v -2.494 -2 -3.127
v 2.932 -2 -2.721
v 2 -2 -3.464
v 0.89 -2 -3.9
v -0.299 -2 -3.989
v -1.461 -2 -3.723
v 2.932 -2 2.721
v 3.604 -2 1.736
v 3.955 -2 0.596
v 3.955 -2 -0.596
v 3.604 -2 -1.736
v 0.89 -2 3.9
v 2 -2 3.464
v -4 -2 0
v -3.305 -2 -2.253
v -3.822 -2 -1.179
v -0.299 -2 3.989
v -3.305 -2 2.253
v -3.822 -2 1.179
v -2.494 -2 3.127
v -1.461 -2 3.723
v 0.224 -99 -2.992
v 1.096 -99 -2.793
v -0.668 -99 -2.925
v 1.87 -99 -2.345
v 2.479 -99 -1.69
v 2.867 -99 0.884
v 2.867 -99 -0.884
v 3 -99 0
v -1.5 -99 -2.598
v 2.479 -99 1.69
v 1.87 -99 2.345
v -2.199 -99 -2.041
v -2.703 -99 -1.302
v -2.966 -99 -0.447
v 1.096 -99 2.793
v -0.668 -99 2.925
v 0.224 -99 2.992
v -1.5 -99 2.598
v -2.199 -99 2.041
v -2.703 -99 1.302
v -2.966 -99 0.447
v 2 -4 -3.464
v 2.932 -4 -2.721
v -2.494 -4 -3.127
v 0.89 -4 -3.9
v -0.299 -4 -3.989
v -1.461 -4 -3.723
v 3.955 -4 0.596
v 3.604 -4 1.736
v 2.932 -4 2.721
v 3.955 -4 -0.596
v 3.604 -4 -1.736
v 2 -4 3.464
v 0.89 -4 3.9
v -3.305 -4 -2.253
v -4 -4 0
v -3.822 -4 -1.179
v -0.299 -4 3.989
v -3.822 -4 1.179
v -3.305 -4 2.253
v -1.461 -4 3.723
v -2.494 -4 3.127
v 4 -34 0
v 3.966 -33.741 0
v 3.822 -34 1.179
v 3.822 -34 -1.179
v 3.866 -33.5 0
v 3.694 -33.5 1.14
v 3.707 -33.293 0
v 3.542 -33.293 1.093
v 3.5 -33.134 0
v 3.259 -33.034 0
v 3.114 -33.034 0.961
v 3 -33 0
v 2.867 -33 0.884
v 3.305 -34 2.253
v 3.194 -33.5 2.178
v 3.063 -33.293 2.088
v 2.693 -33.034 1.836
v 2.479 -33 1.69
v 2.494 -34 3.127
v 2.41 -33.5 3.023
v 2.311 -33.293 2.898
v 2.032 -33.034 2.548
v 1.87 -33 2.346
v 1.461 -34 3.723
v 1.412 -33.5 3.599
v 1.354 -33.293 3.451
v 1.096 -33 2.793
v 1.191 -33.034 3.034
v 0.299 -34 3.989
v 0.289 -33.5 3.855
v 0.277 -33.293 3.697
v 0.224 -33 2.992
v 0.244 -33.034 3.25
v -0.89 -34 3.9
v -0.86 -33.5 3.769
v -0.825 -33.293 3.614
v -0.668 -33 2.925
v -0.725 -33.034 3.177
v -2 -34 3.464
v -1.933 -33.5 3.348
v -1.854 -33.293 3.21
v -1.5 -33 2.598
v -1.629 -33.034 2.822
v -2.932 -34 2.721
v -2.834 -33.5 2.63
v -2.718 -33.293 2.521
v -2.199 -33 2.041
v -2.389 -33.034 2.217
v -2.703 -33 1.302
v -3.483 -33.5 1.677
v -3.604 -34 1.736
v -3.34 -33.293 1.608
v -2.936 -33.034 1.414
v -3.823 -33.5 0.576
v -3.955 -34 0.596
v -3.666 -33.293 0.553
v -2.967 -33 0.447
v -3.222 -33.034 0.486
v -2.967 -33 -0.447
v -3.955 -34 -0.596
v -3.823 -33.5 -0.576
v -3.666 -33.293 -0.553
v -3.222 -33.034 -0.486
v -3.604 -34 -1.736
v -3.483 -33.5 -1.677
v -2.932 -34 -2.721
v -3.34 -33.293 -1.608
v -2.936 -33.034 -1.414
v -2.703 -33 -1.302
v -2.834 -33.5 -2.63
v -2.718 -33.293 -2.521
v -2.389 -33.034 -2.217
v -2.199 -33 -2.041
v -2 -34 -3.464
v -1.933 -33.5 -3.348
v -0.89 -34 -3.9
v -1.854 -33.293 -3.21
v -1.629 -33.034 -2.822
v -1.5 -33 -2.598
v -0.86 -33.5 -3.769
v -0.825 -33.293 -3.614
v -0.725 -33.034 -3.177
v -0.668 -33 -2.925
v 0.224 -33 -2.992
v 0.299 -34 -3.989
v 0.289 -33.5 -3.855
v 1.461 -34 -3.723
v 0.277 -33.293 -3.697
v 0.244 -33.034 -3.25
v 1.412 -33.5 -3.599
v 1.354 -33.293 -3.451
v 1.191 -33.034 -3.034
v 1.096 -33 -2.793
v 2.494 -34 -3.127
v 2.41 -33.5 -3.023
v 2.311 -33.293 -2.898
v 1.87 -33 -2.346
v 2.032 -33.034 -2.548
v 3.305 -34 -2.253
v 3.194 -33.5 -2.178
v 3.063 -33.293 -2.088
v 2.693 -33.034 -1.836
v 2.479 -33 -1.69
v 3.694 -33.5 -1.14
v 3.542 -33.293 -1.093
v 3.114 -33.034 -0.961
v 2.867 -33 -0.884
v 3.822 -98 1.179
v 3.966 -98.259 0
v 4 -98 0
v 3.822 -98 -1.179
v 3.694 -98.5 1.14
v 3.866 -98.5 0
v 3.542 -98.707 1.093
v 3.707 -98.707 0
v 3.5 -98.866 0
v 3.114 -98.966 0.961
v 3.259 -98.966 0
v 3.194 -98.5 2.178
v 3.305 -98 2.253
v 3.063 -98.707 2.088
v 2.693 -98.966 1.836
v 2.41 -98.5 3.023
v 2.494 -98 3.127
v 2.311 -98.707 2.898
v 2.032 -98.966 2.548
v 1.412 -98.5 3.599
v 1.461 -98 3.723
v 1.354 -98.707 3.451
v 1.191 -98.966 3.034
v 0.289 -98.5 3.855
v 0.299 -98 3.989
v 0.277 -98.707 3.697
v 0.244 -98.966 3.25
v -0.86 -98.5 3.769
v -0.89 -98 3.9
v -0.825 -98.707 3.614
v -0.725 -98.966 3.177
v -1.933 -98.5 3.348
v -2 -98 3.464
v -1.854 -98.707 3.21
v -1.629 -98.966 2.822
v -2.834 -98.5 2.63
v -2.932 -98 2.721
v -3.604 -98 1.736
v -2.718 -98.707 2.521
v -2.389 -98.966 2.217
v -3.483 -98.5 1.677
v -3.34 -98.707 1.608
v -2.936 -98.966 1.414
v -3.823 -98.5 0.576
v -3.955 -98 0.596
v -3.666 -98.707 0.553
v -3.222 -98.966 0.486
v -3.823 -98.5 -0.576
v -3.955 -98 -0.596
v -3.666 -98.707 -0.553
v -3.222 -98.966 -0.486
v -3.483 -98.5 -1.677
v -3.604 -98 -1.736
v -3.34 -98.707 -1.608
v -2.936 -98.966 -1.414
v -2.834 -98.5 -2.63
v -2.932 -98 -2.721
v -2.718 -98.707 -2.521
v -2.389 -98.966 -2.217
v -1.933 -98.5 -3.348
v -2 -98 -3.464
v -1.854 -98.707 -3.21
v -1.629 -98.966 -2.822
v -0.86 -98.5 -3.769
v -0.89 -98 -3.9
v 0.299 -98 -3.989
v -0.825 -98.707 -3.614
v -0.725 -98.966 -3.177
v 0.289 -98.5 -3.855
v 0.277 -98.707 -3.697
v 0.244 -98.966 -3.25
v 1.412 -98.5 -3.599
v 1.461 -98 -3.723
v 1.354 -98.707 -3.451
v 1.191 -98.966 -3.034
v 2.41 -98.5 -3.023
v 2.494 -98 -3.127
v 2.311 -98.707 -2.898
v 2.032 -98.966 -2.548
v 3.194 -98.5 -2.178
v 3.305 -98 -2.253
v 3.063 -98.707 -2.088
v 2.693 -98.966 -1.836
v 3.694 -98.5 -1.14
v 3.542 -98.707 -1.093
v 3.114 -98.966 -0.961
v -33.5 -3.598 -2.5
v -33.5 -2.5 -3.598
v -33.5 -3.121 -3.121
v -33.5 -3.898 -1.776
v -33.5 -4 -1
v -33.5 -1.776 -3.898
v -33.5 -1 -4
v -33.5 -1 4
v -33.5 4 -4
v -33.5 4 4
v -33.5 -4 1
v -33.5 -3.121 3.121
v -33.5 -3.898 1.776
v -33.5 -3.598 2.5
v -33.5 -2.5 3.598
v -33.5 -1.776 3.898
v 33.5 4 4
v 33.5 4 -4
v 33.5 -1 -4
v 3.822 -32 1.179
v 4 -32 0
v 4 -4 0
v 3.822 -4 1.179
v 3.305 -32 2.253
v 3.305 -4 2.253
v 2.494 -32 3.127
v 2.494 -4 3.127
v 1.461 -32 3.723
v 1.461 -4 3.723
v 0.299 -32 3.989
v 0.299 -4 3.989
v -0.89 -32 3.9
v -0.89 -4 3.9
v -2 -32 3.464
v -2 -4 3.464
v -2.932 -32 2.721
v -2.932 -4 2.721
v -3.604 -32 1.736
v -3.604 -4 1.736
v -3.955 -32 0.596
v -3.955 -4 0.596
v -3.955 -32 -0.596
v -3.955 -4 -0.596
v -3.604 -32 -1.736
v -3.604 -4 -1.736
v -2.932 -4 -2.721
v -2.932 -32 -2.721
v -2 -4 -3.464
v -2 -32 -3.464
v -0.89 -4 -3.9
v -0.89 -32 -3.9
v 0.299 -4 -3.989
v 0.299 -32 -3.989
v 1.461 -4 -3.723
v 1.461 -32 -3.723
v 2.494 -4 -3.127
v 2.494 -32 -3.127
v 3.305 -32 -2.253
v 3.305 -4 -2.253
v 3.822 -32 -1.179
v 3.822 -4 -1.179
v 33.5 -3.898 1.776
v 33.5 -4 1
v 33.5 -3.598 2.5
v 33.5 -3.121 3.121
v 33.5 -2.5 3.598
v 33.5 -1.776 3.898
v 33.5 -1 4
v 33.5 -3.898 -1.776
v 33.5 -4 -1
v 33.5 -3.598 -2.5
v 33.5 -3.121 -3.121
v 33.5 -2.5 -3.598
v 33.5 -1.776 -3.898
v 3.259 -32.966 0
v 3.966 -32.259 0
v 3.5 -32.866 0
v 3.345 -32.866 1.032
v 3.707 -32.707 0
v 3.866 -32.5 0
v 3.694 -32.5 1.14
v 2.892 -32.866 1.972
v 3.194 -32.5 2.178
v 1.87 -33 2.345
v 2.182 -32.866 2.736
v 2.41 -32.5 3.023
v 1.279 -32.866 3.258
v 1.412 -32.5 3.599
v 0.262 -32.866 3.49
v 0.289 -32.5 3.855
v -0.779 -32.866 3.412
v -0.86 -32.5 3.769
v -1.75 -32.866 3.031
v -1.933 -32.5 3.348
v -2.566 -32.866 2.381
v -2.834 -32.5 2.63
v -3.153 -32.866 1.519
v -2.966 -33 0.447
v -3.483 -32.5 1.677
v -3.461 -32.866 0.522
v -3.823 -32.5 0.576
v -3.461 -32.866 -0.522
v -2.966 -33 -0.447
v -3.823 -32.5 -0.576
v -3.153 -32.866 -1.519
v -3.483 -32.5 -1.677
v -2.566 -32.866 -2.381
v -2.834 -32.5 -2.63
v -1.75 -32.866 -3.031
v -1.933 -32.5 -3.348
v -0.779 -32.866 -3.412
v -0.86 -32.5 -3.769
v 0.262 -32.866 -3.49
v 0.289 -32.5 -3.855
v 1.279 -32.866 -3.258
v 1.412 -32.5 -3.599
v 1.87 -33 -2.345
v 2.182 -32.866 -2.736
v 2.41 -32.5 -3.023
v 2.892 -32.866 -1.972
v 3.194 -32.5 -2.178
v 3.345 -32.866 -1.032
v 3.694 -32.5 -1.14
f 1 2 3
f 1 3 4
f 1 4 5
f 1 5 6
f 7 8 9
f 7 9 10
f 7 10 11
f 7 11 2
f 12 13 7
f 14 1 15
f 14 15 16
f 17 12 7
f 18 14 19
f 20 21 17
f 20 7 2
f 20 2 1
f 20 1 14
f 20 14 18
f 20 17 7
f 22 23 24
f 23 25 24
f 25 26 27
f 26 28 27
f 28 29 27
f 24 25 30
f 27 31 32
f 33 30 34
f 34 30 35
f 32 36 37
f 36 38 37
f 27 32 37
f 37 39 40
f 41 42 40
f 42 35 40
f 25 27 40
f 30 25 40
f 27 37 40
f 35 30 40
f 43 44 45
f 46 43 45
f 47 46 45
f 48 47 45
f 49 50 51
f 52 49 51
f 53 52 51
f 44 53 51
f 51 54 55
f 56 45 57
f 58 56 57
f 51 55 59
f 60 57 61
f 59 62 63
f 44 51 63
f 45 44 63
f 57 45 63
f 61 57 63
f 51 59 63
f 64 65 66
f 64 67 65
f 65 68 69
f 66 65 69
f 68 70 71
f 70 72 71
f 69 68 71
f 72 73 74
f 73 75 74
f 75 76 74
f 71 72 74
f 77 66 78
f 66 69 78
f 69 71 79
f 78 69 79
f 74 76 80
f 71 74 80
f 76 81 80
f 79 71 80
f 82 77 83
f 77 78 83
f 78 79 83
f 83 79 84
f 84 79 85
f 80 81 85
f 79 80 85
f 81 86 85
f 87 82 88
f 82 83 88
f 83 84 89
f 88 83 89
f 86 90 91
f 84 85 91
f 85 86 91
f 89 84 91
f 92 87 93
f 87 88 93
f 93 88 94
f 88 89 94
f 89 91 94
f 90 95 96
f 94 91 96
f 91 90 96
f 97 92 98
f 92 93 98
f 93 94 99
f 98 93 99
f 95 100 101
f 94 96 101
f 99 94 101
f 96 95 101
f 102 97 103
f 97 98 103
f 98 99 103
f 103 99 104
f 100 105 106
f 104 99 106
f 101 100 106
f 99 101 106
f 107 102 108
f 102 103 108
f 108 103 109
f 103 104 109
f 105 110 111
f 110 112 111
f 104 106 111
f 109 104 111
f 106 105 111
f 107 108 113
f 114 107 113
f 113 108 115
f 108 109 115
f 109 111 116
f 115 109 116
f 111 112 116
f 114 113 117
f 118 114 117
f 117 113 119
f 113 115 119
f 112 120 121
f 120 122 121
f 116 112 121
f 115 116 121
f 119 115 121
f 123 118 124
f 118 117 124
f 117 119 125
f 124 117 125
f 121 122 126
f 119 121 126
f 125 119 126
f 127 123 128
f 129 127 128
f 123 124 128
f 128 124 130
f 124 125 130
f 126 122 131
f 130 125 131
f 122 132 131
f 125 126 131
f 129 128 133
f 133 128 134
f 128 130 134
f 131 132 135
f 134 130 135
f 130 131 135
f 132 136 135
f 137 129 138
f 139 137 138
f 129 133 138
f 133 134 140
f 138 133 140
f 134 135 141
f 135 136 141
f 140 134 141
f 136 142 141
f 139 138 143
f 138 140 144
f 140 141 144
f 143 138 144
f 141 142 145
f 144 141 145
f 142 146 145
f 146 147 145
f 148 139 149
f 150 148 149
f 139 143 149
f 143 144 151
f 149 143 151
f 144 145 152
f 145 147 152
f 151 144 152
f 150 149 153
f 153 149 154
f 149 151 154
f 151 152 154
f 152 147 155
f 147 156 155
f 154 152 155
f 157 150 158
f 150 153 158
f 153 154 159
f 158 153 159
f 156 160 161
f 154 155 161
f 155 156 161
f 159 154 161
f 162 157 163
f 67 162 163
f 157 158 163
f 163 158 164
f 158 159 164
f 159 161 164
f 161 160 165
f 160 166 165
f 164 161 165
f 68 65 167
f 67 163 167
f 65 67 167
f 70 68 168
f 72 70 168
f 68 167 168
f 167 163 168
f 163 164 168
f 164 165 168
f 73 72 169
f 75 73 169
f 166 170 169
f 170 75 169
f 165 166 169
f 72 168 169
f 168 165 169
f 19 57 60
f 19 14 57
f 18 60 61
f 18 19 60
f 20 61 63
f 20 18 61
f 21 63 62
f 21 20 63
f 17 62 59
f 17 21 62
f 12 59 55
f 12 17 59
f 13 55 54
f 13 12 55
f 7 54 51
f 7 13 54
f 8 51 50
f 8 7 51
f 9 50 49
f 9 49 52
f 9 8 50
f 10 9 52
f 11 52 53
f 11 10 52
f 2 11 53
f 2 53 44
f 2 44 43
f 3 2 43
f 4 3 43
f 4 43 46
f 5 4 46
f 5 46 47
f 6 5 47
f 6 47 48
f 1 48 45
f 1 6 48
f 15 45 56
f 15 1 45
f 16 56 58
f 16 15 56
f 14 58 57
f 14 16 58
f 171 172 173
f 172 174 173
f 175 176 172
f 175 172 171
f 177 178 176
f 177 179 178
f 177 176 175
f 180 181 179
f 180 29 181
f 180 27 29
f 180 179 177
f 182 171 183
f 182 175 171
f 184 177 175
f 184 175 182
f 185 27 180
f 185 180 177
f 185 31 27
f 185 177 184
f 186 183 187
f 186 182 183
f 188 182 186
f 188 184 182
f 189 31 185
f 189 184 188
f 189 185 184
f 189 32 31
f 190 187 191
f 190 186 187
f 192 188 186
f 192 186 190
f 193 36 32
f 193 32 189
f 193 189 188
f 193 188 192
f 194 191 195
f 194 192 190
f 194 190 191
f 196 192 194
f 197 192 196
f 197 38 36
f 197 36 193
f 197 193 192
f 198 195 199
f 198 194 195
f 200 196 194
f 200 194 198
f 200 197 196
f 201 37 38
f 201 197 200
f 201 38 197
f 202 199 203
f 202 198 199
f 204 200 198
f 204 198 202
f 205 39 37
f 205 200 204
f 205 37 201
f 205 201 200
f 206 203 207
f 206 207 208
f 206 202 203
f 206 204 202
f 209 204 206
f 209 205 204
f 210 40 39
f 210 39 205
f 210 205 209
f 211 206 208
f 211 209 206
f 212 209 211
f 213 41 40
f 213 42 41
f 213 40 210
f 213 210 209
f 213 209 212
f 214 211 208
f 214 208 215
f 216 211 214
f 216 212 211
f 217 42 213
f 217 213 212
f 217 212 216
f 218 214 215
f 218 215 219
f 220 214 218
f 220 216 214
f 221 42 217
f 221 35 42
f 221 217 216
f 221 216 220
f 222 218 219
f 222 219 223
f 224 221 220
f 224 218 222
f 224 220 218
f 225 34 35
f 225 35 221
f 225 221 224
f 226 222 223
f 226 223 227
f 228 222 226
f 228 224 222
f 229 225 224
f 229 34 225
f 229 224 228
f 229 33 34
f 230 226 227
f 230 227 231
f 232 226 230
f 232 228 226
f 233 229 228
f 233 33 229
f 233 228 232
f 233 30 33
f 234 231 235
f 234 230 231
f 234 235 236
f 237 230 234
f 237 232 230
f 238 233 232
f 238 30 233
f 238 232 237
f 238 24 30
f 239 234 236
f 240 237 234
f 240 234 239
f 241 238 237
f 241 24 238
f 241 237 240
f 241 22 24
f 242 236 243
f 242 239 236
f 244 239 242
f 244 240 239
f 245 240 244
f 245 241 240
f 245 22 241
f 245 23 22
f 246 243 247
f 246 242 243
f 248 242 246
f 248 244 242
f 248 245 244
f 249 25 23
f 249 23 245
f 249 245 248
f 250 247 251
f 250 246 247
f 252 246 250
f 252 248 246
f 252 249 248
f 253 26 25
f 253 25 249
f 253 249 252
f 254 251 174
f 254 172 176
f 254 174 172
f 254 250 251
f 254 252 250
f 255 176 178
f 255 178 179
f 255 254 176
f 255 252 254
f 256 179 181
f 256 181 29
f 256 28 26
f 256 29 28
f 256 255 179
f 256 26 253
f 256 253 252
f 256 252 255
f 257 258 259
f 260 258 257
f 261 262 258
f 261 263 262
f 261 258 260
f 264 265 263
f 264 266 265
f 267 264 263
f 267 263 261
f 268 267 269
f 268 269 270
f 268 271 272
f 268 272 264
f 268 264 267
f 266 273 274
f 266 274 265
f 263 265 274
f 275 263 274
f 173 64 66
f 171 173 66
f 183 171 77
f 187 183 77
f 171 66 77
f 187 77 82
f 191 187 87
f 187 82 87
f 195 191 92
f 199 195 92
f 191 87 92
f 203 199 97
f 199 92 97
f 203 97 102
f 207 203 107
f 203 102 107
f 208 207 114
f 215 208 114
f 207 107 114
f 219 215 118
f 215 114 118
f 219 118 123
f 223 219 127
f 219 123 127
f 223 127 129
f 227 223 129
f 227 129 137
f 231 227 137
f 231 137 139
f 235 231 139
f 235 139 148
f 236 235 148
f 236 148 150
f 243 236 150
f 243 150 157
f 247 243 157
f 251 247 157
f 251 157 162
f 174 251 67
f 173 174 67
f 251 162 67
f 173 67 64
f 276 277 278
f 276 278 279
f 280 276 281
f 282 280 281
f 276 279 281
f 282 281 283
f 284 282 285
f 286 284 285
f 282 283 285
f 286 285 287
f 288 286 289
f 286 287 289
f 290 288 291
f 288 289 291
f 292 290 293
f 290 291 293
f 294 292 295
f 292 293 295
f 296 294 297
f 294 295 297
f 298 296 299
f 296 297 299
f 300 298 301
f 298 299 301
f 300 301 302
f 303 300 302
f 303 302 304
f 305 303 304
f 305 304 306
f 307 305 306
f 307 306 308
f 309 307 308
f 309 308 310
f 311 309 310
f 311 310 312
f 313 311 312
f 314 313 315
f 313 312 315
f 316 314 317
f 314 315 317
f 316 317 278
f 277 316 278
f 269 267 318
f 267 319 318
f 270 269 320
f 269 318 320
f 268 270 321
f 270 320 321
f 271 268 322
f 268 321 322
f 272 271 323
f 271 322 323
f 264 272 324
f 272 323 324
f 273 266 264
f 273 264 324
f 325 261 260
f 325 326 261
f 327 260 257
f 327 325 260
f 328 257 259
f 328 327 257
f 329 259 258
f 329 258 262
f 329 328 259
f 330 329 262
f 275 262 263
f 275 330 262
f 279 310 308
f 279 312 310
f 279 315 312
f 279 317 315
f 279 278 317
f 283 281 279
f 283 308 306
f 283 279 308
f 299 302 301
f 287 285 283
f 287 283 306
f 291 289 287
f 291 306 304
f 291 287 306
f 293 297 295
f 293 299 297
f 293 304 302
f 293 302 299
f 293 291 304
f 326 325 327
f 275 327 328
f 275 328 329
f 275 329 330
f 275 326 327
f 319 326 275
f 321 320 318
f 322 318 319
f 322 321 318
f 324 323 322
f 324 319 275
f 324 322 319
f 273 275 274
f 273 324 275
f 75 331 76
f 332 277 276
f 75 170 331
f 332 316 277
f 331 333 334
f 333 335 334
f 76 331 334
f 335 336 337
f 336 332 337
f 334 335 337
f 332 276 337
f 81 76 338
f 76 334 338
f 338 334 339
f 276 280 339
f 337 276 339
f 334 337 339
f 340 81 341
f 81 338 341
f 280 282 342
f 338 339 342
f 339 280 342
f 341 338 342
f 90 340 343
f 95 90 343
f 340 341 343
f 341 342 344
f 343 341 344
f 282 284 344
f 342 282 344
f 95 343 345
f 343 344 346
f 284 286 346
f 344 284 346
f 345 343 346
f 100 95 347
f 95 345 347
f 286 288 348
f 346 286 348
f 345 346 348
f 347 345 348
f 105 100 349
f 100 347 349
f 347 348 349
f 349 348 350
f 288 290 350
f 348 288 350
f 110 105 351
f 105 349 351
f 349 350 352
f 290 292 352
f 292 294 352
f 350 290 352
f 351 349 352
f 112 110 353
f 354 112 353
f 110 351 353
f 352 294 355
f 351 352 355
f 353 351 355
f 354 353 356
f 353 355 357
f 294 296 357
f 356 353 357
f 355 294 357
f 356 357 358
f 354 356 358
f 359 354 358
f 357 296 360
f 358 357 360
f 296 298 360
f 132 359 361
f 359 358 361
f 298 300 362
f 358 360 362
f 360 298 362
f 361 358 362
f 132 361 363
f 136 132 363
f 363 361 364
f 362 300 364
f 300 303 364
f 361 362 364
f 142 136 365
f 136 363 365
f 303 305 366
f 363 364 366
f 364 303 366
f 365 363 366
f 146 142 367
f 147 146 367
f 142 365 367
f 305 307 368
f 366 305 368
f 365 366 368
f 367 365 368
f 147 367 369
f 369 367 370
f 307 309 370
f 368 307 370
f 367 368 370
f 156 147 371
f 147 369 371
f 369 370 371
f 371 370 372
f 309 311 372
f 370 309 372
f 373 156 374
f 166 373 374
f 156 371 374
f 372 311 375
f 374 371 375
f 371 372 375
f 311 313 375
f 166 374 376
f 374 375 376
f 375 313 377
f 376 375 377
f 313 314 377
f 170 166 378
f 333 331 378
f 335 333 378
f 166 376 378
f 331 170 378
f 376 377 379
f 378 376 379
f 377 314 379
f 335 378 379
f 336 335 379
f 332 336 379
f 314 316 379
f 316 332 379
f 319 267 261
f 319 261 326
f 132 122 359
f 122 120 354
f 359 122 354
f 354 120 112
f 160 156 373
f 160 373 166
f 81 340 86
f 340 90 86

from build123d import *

# Parameters (mm, degrees)
F0_W     = 4
F0_H     = 29
F2_R     = 1
F0_H_2   = 2
F0_H_3   = 6
F3_DEPTH = 4
F5_R     = 0.99999
F6_R     = 1
F7_R     = 3


# Not quite as in the source:
# - a fillet or chamfer is up to 0.001 mm smaller than in the source, because OpenCascade refuses the exact size


with BuildPart() as f1:
    # F0 (on Top) → F1 (revolve)
    with BuildSketch(Plane.XY):
        with Locations((2, -18.5)):
            Rectangle(F0_W, F0_H)
    revolve(axis=Axis((0, -27.75, 0), (0, -1, 0)))

    # F2
    f2_edges = [f1.edges().sort_by_distance(p)[0] for p in [
        (-4, -33, 0),
    ]]
    fillet(f2_edges, radius=F2_R)

    # F0 (on Top) → F4 (revolve)
    with BuildSketch(Plane.XY):
        Polygon((4, -99), (4, -33), (0, -33), (0, -51.5), (0, -99), align=None)
    revolve(axis=Axis((0, -75.25, 0), (0, -1, 0)))

    # F5 (radius 1 in the source; OpenCascade refuses exactly that, so slightly less here)
    f5_edges = [f1.edges().sort_by_distance(p)[0] for p in [
        (-4, -33, 0),
    ]]
    fillet(f5_edges, radius=F5_R)

    # F6
    f6_edges = [f1.edges().sort_by_distance(p)[0] for p in [
        (-4, -99, 0),
    ]]
    fillet(f6_edges, radius=F6_R)


with BuildPart() as f3:
    # F0 (on Top) → F3 (new body, symmetric)
    with BuildSketch(Plane.XY):
        with Locations((2, -3)):
            Rectangle(F0_W, F0_H_2)
        with Locations((2, 1)):
            Rectangle(F0_W, F0_H_3)
        with Locations((-2, 1)):
            Rectangle(F0_W, F0_H_3)
        with Locations((-2, -3)):
            Rectangle(F0_W, F0_H_2)
        Polygon((33.5, -4), (33.5, 4), (4, 4), (4, -2), (4, -4), align=None)
        Polygon((-4, -2), (-4, 4), (-33.5, 4), (-33.5, -4), (-4, -4), align=None)
    extrude(amount=F3_DEPTH, both=True)

    # F7
    f7_edges = [f3.edges().sort_by_distance(p)[0] for p in [
        (0, -4, -4),
        (0, -4, 4),
    ]]
    fillet(f7_edges, radius=F7_R)


with BuildPart() as f8:
    # F0 (on Top) → F8 (revolve)
    with BuildSketch(Plane.XY):
        with Locations((-2, -3)):
            Rectangle(F0_W, F0_H_2)
    revolve(axis=Axis((0, 0, 0), (0, 1, 0)))


solid = Compound([f1.part, f3.part, f8.part])
